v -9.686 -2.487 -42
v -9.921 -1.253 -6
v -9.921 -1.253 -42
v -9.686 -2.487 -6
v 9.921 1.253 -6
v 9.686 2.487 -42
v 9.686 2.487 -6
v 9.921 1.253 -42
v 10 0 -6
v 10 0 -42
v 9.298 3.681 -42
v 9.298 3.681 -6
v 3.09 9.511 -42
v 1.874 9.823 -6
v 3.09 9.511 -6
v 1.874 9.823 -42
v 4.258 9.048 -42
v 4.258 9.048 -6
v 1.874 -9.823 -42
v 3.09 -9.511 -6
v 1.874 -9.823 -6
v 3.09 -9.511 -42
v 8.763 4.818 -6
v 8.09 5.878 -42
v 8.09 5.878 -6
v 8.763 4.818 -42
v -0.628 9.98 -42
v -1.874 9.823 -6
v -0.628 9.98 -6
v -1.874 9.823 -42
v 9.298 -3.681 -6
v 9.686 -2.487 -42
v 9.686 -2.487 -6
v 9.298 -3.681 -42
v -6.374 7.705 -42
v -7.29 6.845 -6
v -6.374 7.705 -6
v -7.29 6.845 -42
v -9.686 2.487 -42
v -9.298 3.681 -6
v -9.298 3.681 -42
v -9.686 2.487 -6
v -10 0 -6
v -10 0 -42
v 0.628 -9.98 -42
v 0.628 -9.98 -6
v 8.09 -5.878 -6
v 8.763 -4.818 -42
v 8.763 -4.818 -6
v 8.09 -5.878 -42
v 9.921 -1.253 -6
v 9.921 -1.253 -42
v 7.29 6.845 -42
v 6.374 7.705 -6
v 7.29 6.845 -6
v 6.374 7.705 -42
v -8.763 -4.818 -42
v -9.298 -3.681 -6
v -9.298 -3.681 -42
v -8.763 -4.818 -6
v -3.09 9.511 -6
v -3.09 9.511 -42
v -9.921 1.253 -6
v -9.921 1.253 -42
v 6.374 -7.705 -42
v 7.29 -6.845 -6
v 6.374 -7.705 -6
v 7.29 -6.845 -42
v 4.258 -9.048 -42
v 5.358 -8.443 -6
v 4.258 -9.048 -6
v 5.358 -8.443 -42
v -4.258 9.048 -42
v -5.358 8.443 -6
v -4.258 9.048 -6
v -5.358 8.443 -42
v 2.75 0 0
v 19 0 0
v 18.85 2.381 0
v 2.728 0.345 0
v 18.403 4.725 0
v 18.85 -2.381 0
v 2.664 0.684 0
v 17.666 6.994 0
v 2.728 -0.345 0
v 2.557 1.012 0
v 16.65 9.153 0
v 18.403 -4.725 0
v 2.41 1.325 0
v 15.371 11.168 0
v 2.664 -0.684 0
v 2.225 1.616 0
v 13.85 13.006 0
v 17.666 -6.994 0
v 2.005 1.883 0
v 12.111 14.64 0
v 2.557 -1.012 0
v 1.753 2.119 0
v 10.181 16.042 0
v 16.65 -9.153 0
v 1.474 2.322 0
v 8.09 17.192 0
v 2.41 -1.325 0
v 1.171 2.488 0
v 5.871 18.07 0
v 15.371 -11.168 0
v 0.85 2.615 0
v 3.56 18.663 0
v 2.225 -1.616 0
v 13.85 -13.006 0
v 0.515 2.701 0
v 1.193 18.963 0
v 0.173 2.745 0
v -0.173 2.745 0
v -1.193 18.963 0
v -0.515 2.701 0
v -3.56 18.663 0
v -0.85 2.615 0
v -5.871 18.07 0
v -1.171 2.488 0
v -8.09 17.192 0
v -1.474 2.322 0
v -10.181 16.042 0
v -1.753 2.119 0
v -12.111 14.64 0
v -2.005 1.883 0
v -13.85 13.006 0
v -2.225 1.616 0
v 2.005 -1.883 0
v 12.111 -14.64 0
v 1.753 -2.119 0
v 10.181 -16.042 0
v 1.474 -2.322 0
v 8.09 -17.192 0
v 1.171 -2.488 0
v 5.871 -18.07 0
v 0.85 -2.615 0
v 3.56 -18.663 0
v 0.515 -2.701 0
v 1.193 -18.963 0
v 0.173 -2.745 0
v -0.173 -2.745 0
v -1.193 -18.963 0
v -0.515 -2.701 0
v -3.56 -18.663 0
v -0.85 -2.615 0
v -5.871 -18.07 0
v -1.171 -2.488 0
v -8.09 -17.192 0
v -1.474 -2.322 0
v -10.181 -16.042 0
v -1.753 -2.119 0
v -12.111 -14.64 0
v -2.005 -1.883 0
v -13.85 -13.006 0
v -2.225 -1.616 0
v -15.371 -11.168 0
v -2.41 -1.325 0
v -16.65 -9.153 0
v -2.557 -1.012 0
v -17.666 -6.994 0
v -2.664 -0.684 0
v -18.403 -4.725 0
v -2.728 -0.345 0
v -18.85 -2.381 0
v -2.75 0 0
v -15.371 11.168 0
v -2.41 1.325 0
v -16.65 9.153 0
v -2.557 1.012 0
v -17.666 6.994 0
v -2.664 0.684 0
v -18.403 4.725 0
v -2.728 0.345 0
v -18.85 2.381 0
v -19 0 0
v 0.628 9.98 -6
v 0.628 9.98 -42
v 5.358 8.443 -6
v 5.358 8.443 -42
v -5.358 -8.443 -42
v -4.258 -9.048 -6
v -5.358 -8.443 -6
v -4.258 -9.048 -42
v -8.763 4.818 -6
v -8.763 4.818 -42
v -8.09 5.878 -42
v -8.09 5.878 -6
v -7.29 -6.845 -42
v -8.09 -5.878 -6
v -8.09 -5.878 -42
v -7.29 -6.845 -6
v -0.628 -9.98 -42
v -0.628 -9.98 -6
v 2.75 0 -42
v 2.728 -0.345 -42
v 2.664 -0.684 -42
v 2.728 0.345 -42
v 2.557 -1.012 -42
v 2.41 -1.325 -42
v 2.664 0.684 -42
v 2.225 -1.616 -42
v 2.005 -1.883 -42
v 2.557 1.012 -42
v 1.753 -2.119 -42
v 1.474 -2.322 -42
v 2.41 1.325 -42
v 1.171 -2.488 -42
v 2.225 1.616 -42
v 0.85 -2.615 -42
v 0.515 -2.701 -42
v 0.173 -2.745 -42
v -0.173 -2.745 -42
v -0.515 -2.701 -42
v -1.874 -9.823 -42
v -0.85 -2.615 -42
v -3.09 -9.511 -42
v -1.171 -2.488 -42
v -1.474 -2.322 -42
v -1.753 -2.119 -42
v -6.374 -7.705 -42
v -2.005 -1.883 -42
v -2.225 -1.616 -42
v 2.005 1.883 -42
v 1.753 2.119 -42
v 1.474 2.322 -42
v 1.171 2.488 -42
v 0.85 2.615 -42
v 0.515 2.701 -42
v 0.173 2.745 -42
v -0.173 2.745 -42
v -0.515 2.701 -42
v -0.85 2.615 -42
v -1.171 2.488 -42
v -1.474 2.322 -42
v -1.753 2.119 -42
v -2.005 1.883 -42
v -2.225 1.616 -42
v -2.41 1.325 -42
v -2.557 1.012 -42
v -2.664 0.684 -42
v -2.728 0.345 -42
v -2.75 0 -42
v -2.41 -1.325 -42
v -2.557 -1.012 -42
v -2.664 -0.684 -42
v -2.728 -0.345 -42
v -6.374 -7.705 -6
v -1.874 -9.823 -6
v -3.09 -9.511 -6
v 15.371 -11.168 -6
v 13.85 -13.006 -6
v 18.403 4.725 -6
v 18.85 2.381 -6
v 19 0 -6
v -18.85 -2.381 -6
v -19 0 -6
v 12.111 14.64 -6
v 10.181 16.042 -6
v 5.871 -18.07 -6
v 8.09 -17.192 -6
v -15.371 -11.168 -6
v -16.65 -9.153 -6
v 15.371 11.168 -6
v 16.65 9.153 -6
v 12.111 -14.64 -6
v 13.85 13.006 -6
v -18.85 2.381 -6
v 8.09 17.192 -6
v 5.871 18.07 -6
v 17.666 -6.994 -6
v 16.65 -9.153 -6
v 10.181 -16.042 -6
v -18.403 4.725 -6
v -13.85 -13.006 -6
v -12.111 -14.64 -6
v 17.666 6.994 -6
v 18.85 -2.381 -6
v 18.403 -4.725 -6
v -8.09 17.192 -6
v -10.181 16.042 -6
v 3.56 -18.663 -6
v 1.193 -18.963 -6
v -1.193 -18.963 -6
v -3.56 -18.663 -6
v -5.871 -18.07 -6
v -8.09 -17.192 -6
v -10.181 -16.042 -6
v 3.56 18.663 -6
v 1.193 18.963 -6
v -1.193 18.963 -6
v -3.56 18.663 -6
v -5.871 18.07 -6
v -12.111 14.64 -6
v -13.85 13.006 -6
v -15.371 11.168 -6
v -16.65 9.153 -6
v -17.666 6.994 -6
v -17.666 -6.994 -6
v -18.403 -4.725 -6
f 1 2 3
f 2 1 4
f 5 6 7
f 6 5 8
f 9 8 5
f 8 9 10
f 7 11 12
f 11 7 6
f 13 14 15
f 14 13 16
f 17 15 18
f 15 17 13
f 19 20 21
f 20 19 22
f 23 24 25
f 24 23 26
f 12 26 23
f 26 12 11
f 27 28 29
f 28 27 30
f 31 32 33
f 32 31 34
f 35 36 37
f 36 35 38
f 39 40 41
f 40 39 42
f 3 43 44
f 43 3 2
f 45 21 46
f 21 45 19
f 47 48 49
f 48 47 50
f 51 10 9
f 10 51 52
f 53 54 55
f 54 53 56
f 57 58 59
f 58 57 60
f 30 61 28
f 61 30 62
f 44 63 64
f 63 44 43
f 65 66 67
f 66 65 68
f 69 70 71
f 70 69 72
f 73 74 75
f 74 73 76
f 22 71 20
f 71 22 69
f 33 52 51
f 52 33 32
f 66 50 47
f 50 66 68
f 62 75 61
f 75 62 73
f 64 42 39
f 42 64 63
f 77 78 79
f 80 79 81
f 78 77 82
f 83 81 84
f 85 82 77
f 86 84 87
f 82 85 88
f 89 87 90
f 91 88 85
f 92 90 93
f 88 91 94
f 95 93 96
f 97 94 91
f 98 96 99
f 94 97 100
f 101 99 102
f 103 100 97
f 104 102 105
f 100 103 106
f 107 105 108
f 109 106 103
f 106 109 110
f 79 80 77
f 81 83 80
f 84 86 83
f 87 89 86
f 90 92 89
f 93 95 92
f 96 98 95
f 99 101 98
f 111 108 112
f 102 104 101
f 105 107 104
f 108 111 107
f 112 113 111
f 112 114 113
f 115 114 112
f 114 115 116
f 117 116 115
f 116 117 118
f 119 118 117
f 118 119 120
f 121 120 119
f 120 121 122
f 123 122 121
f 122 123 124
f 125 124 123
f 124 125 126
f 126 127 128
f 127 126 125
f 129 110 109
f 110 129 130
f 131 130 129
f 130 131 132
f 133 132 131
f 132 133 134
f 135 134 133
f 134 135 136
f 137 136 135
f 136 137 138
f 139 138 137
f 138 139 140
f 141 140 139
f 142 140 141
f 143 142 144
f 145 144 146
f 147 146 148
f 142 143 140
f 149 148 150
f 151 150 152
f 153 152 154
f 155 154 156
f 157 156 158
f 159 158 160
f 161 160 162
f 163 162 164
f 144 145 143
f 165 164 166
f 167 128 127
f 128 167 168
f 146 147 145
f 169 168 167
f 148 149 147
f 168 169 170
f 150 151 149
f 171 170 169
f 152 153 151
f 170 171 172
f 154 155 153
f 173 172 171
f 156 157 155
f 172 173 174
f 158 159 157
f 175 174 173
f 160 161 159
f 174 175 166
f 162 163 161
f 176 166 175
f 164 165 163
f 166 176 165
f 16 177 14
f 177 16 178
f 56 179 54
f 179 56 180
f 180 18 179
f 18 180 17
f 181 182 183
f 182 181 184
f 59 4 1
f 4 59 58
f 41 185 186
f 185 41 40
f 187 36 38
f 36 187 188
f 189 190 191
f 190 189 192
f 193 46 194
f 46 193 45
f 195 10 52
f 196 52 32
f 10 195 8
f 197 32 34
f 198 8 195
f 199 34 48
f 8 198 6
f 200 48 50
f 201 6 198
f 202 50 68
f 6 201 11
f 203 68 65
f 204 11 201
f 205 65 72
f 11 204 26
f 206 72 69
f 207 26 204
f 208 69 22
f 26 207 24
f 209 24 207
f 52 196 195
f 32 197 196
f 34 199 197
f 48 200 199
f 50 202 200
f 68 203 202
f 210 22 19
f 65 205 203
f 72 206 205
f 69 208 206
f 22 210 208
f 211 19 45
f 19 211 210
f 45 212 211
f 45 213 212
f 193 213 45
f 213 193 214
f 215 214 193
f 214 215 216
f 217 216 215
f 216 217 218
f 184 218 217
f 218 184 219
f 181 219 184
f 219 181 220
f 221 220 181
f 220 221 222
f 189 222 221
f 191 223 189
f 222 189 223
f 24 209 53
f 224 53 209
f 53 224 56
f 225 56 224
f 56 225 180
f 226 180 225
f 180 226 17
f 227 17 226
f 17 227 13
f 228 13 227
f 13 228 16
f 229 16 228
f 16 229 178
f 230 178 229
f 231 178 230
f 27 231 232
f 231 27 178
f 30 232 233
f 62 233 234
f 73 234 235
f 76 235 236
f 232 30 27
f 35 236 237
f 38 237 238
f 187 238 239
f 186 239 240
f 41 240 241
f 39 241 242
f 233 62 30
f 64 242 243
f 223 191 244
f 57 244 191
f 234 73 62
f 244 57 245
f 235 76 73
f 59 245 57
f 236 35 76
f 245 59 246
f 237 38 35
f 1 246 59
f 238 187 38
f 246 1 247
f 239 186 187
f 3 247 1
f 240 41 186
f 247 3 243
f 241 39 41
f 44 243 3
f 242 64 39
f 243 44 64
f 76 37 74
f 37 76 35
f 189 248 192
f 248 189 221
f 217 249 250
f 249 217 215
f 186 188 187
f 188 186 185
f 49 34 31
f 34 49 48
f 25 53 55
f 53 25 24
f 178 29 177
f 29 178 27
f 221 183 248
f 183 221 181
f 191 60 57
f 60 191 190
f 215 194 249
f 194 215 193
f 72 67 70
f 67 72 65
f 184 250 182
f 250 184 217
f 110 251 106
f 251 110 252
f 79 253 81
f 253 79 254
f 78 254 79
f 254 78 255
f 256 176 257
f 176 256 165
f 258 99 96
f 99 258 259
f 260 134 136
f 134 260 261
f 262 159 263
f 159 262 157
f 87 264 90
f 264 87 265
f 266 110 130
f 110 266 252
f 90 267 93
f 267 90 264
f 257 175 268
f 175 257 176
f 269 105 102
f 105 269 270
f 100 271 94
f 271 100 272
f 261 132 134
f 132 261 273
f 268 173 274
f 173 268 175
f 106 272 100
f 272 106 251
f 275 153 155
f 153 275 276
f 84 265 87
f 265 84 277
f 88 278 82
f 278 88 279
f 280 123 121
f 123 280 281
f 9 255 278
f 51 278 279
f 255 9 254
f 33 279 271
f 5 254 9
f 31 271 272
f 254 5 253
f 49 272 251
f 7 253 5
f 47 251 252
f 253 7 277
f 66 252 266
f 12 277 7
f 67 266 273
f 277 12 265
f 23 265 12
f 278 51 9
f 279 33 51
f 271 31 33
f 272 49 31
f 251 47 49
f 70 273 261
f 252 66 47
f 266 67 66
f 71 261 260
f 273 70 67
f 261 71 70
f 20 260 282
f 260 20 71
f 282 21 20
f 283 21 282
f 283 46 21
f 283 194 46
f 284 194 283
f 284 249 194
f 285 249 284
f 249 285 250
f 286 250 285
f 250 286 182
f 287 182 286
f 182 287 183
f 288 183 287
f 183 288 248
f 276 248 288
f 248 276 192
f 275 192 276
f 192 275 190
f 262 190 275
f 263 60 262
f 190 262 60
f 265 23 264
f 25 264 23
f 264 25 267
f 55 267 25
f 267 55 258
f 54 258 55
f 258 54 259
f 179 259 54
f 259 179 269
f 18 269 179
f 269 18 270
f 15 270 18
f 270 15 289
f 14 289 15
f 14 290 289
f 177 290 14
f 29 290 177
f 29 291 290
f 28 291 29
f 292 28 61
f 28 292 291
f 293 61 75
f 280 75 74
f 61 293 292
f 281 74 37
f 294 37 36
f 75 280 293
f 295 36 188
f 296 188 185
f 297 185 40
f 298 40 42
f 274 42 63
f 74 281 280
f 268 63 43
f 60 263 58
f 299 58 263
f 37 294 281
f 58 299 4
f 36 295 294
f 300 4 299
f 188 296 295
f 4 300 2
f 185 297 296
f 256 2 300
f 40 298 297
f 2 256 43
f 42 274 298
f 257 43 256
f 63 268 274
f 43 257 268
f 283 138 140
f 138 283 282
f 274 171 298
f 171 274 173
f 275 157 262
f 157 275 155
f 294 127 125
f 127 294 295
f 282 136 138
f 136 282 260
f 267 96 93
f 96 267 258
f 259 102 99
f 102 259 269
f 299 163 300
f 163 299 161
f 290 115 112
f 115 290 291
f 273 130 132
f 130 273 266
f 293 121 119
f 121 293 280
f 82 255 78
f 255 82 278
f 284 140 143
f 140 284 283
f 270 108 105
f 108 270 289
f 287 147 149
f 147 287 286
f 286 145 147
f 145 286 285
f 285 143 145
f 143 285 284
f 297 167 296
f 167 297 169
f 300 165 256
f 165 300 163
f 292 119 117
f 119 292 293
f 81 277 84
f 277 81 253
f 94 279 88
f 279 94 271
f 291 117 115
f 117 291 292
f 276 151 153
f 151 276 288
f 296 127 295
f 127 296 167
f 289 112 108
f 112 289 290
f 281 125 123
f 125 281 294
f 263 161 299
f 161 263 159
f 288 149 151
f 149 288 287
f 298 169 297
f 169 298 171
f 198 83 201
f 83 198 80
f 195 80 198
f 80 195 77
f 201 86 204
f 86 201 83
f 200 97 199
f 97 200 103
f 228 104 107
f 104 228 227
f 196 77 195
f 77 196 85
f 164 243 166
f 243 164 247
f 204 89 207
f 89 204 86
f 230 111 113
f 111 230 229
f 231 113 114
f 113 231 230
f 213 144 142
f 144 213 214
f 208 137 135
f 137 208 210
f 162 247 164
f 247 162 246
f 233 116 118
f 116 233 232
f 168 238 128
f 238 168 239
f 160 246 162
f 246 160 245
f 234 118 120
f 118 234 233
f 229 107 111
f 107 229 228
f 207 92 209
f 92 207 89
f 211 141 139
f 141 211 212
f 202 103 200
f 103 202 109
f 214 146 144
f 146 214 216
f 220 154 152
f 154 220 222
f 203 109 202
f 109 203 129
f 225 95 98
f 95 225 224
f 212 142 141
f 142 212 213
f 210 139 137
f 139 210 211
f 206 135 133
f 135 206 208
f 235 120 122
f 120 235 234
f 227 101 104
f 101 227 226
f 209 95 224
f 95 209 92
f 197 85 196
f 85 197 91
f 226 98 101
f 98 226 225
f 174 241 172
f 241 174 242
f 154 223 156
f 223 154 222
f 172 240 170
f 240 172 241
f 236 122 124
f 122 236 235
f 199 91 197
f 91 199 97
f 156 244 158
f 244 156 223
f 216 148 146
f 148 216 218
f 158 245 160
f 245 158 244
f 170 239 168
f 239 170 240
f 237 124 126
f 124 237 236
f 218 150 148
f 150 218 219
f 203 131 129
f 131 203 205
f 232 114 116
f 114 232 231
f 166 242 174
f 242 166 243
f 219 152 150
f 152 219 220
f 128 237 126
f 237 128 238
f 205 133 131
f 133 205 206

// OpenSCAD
$fn = 50;


difference() {
	union() {
		translate(v = [0, 0, -42.0000000000]) {
			cylinder(h = 42, r = 10.0000000000);
		}
		translate(v = [0, 0, -6.0000000000]) {
			cylinder(h = 6, r = 19.0000000000);
		}
	}
	union() {
		#translate(v = [0, 0, -42]) {
			cylinder(h = 42, r = 2.7500000000);
		}
	}
}
